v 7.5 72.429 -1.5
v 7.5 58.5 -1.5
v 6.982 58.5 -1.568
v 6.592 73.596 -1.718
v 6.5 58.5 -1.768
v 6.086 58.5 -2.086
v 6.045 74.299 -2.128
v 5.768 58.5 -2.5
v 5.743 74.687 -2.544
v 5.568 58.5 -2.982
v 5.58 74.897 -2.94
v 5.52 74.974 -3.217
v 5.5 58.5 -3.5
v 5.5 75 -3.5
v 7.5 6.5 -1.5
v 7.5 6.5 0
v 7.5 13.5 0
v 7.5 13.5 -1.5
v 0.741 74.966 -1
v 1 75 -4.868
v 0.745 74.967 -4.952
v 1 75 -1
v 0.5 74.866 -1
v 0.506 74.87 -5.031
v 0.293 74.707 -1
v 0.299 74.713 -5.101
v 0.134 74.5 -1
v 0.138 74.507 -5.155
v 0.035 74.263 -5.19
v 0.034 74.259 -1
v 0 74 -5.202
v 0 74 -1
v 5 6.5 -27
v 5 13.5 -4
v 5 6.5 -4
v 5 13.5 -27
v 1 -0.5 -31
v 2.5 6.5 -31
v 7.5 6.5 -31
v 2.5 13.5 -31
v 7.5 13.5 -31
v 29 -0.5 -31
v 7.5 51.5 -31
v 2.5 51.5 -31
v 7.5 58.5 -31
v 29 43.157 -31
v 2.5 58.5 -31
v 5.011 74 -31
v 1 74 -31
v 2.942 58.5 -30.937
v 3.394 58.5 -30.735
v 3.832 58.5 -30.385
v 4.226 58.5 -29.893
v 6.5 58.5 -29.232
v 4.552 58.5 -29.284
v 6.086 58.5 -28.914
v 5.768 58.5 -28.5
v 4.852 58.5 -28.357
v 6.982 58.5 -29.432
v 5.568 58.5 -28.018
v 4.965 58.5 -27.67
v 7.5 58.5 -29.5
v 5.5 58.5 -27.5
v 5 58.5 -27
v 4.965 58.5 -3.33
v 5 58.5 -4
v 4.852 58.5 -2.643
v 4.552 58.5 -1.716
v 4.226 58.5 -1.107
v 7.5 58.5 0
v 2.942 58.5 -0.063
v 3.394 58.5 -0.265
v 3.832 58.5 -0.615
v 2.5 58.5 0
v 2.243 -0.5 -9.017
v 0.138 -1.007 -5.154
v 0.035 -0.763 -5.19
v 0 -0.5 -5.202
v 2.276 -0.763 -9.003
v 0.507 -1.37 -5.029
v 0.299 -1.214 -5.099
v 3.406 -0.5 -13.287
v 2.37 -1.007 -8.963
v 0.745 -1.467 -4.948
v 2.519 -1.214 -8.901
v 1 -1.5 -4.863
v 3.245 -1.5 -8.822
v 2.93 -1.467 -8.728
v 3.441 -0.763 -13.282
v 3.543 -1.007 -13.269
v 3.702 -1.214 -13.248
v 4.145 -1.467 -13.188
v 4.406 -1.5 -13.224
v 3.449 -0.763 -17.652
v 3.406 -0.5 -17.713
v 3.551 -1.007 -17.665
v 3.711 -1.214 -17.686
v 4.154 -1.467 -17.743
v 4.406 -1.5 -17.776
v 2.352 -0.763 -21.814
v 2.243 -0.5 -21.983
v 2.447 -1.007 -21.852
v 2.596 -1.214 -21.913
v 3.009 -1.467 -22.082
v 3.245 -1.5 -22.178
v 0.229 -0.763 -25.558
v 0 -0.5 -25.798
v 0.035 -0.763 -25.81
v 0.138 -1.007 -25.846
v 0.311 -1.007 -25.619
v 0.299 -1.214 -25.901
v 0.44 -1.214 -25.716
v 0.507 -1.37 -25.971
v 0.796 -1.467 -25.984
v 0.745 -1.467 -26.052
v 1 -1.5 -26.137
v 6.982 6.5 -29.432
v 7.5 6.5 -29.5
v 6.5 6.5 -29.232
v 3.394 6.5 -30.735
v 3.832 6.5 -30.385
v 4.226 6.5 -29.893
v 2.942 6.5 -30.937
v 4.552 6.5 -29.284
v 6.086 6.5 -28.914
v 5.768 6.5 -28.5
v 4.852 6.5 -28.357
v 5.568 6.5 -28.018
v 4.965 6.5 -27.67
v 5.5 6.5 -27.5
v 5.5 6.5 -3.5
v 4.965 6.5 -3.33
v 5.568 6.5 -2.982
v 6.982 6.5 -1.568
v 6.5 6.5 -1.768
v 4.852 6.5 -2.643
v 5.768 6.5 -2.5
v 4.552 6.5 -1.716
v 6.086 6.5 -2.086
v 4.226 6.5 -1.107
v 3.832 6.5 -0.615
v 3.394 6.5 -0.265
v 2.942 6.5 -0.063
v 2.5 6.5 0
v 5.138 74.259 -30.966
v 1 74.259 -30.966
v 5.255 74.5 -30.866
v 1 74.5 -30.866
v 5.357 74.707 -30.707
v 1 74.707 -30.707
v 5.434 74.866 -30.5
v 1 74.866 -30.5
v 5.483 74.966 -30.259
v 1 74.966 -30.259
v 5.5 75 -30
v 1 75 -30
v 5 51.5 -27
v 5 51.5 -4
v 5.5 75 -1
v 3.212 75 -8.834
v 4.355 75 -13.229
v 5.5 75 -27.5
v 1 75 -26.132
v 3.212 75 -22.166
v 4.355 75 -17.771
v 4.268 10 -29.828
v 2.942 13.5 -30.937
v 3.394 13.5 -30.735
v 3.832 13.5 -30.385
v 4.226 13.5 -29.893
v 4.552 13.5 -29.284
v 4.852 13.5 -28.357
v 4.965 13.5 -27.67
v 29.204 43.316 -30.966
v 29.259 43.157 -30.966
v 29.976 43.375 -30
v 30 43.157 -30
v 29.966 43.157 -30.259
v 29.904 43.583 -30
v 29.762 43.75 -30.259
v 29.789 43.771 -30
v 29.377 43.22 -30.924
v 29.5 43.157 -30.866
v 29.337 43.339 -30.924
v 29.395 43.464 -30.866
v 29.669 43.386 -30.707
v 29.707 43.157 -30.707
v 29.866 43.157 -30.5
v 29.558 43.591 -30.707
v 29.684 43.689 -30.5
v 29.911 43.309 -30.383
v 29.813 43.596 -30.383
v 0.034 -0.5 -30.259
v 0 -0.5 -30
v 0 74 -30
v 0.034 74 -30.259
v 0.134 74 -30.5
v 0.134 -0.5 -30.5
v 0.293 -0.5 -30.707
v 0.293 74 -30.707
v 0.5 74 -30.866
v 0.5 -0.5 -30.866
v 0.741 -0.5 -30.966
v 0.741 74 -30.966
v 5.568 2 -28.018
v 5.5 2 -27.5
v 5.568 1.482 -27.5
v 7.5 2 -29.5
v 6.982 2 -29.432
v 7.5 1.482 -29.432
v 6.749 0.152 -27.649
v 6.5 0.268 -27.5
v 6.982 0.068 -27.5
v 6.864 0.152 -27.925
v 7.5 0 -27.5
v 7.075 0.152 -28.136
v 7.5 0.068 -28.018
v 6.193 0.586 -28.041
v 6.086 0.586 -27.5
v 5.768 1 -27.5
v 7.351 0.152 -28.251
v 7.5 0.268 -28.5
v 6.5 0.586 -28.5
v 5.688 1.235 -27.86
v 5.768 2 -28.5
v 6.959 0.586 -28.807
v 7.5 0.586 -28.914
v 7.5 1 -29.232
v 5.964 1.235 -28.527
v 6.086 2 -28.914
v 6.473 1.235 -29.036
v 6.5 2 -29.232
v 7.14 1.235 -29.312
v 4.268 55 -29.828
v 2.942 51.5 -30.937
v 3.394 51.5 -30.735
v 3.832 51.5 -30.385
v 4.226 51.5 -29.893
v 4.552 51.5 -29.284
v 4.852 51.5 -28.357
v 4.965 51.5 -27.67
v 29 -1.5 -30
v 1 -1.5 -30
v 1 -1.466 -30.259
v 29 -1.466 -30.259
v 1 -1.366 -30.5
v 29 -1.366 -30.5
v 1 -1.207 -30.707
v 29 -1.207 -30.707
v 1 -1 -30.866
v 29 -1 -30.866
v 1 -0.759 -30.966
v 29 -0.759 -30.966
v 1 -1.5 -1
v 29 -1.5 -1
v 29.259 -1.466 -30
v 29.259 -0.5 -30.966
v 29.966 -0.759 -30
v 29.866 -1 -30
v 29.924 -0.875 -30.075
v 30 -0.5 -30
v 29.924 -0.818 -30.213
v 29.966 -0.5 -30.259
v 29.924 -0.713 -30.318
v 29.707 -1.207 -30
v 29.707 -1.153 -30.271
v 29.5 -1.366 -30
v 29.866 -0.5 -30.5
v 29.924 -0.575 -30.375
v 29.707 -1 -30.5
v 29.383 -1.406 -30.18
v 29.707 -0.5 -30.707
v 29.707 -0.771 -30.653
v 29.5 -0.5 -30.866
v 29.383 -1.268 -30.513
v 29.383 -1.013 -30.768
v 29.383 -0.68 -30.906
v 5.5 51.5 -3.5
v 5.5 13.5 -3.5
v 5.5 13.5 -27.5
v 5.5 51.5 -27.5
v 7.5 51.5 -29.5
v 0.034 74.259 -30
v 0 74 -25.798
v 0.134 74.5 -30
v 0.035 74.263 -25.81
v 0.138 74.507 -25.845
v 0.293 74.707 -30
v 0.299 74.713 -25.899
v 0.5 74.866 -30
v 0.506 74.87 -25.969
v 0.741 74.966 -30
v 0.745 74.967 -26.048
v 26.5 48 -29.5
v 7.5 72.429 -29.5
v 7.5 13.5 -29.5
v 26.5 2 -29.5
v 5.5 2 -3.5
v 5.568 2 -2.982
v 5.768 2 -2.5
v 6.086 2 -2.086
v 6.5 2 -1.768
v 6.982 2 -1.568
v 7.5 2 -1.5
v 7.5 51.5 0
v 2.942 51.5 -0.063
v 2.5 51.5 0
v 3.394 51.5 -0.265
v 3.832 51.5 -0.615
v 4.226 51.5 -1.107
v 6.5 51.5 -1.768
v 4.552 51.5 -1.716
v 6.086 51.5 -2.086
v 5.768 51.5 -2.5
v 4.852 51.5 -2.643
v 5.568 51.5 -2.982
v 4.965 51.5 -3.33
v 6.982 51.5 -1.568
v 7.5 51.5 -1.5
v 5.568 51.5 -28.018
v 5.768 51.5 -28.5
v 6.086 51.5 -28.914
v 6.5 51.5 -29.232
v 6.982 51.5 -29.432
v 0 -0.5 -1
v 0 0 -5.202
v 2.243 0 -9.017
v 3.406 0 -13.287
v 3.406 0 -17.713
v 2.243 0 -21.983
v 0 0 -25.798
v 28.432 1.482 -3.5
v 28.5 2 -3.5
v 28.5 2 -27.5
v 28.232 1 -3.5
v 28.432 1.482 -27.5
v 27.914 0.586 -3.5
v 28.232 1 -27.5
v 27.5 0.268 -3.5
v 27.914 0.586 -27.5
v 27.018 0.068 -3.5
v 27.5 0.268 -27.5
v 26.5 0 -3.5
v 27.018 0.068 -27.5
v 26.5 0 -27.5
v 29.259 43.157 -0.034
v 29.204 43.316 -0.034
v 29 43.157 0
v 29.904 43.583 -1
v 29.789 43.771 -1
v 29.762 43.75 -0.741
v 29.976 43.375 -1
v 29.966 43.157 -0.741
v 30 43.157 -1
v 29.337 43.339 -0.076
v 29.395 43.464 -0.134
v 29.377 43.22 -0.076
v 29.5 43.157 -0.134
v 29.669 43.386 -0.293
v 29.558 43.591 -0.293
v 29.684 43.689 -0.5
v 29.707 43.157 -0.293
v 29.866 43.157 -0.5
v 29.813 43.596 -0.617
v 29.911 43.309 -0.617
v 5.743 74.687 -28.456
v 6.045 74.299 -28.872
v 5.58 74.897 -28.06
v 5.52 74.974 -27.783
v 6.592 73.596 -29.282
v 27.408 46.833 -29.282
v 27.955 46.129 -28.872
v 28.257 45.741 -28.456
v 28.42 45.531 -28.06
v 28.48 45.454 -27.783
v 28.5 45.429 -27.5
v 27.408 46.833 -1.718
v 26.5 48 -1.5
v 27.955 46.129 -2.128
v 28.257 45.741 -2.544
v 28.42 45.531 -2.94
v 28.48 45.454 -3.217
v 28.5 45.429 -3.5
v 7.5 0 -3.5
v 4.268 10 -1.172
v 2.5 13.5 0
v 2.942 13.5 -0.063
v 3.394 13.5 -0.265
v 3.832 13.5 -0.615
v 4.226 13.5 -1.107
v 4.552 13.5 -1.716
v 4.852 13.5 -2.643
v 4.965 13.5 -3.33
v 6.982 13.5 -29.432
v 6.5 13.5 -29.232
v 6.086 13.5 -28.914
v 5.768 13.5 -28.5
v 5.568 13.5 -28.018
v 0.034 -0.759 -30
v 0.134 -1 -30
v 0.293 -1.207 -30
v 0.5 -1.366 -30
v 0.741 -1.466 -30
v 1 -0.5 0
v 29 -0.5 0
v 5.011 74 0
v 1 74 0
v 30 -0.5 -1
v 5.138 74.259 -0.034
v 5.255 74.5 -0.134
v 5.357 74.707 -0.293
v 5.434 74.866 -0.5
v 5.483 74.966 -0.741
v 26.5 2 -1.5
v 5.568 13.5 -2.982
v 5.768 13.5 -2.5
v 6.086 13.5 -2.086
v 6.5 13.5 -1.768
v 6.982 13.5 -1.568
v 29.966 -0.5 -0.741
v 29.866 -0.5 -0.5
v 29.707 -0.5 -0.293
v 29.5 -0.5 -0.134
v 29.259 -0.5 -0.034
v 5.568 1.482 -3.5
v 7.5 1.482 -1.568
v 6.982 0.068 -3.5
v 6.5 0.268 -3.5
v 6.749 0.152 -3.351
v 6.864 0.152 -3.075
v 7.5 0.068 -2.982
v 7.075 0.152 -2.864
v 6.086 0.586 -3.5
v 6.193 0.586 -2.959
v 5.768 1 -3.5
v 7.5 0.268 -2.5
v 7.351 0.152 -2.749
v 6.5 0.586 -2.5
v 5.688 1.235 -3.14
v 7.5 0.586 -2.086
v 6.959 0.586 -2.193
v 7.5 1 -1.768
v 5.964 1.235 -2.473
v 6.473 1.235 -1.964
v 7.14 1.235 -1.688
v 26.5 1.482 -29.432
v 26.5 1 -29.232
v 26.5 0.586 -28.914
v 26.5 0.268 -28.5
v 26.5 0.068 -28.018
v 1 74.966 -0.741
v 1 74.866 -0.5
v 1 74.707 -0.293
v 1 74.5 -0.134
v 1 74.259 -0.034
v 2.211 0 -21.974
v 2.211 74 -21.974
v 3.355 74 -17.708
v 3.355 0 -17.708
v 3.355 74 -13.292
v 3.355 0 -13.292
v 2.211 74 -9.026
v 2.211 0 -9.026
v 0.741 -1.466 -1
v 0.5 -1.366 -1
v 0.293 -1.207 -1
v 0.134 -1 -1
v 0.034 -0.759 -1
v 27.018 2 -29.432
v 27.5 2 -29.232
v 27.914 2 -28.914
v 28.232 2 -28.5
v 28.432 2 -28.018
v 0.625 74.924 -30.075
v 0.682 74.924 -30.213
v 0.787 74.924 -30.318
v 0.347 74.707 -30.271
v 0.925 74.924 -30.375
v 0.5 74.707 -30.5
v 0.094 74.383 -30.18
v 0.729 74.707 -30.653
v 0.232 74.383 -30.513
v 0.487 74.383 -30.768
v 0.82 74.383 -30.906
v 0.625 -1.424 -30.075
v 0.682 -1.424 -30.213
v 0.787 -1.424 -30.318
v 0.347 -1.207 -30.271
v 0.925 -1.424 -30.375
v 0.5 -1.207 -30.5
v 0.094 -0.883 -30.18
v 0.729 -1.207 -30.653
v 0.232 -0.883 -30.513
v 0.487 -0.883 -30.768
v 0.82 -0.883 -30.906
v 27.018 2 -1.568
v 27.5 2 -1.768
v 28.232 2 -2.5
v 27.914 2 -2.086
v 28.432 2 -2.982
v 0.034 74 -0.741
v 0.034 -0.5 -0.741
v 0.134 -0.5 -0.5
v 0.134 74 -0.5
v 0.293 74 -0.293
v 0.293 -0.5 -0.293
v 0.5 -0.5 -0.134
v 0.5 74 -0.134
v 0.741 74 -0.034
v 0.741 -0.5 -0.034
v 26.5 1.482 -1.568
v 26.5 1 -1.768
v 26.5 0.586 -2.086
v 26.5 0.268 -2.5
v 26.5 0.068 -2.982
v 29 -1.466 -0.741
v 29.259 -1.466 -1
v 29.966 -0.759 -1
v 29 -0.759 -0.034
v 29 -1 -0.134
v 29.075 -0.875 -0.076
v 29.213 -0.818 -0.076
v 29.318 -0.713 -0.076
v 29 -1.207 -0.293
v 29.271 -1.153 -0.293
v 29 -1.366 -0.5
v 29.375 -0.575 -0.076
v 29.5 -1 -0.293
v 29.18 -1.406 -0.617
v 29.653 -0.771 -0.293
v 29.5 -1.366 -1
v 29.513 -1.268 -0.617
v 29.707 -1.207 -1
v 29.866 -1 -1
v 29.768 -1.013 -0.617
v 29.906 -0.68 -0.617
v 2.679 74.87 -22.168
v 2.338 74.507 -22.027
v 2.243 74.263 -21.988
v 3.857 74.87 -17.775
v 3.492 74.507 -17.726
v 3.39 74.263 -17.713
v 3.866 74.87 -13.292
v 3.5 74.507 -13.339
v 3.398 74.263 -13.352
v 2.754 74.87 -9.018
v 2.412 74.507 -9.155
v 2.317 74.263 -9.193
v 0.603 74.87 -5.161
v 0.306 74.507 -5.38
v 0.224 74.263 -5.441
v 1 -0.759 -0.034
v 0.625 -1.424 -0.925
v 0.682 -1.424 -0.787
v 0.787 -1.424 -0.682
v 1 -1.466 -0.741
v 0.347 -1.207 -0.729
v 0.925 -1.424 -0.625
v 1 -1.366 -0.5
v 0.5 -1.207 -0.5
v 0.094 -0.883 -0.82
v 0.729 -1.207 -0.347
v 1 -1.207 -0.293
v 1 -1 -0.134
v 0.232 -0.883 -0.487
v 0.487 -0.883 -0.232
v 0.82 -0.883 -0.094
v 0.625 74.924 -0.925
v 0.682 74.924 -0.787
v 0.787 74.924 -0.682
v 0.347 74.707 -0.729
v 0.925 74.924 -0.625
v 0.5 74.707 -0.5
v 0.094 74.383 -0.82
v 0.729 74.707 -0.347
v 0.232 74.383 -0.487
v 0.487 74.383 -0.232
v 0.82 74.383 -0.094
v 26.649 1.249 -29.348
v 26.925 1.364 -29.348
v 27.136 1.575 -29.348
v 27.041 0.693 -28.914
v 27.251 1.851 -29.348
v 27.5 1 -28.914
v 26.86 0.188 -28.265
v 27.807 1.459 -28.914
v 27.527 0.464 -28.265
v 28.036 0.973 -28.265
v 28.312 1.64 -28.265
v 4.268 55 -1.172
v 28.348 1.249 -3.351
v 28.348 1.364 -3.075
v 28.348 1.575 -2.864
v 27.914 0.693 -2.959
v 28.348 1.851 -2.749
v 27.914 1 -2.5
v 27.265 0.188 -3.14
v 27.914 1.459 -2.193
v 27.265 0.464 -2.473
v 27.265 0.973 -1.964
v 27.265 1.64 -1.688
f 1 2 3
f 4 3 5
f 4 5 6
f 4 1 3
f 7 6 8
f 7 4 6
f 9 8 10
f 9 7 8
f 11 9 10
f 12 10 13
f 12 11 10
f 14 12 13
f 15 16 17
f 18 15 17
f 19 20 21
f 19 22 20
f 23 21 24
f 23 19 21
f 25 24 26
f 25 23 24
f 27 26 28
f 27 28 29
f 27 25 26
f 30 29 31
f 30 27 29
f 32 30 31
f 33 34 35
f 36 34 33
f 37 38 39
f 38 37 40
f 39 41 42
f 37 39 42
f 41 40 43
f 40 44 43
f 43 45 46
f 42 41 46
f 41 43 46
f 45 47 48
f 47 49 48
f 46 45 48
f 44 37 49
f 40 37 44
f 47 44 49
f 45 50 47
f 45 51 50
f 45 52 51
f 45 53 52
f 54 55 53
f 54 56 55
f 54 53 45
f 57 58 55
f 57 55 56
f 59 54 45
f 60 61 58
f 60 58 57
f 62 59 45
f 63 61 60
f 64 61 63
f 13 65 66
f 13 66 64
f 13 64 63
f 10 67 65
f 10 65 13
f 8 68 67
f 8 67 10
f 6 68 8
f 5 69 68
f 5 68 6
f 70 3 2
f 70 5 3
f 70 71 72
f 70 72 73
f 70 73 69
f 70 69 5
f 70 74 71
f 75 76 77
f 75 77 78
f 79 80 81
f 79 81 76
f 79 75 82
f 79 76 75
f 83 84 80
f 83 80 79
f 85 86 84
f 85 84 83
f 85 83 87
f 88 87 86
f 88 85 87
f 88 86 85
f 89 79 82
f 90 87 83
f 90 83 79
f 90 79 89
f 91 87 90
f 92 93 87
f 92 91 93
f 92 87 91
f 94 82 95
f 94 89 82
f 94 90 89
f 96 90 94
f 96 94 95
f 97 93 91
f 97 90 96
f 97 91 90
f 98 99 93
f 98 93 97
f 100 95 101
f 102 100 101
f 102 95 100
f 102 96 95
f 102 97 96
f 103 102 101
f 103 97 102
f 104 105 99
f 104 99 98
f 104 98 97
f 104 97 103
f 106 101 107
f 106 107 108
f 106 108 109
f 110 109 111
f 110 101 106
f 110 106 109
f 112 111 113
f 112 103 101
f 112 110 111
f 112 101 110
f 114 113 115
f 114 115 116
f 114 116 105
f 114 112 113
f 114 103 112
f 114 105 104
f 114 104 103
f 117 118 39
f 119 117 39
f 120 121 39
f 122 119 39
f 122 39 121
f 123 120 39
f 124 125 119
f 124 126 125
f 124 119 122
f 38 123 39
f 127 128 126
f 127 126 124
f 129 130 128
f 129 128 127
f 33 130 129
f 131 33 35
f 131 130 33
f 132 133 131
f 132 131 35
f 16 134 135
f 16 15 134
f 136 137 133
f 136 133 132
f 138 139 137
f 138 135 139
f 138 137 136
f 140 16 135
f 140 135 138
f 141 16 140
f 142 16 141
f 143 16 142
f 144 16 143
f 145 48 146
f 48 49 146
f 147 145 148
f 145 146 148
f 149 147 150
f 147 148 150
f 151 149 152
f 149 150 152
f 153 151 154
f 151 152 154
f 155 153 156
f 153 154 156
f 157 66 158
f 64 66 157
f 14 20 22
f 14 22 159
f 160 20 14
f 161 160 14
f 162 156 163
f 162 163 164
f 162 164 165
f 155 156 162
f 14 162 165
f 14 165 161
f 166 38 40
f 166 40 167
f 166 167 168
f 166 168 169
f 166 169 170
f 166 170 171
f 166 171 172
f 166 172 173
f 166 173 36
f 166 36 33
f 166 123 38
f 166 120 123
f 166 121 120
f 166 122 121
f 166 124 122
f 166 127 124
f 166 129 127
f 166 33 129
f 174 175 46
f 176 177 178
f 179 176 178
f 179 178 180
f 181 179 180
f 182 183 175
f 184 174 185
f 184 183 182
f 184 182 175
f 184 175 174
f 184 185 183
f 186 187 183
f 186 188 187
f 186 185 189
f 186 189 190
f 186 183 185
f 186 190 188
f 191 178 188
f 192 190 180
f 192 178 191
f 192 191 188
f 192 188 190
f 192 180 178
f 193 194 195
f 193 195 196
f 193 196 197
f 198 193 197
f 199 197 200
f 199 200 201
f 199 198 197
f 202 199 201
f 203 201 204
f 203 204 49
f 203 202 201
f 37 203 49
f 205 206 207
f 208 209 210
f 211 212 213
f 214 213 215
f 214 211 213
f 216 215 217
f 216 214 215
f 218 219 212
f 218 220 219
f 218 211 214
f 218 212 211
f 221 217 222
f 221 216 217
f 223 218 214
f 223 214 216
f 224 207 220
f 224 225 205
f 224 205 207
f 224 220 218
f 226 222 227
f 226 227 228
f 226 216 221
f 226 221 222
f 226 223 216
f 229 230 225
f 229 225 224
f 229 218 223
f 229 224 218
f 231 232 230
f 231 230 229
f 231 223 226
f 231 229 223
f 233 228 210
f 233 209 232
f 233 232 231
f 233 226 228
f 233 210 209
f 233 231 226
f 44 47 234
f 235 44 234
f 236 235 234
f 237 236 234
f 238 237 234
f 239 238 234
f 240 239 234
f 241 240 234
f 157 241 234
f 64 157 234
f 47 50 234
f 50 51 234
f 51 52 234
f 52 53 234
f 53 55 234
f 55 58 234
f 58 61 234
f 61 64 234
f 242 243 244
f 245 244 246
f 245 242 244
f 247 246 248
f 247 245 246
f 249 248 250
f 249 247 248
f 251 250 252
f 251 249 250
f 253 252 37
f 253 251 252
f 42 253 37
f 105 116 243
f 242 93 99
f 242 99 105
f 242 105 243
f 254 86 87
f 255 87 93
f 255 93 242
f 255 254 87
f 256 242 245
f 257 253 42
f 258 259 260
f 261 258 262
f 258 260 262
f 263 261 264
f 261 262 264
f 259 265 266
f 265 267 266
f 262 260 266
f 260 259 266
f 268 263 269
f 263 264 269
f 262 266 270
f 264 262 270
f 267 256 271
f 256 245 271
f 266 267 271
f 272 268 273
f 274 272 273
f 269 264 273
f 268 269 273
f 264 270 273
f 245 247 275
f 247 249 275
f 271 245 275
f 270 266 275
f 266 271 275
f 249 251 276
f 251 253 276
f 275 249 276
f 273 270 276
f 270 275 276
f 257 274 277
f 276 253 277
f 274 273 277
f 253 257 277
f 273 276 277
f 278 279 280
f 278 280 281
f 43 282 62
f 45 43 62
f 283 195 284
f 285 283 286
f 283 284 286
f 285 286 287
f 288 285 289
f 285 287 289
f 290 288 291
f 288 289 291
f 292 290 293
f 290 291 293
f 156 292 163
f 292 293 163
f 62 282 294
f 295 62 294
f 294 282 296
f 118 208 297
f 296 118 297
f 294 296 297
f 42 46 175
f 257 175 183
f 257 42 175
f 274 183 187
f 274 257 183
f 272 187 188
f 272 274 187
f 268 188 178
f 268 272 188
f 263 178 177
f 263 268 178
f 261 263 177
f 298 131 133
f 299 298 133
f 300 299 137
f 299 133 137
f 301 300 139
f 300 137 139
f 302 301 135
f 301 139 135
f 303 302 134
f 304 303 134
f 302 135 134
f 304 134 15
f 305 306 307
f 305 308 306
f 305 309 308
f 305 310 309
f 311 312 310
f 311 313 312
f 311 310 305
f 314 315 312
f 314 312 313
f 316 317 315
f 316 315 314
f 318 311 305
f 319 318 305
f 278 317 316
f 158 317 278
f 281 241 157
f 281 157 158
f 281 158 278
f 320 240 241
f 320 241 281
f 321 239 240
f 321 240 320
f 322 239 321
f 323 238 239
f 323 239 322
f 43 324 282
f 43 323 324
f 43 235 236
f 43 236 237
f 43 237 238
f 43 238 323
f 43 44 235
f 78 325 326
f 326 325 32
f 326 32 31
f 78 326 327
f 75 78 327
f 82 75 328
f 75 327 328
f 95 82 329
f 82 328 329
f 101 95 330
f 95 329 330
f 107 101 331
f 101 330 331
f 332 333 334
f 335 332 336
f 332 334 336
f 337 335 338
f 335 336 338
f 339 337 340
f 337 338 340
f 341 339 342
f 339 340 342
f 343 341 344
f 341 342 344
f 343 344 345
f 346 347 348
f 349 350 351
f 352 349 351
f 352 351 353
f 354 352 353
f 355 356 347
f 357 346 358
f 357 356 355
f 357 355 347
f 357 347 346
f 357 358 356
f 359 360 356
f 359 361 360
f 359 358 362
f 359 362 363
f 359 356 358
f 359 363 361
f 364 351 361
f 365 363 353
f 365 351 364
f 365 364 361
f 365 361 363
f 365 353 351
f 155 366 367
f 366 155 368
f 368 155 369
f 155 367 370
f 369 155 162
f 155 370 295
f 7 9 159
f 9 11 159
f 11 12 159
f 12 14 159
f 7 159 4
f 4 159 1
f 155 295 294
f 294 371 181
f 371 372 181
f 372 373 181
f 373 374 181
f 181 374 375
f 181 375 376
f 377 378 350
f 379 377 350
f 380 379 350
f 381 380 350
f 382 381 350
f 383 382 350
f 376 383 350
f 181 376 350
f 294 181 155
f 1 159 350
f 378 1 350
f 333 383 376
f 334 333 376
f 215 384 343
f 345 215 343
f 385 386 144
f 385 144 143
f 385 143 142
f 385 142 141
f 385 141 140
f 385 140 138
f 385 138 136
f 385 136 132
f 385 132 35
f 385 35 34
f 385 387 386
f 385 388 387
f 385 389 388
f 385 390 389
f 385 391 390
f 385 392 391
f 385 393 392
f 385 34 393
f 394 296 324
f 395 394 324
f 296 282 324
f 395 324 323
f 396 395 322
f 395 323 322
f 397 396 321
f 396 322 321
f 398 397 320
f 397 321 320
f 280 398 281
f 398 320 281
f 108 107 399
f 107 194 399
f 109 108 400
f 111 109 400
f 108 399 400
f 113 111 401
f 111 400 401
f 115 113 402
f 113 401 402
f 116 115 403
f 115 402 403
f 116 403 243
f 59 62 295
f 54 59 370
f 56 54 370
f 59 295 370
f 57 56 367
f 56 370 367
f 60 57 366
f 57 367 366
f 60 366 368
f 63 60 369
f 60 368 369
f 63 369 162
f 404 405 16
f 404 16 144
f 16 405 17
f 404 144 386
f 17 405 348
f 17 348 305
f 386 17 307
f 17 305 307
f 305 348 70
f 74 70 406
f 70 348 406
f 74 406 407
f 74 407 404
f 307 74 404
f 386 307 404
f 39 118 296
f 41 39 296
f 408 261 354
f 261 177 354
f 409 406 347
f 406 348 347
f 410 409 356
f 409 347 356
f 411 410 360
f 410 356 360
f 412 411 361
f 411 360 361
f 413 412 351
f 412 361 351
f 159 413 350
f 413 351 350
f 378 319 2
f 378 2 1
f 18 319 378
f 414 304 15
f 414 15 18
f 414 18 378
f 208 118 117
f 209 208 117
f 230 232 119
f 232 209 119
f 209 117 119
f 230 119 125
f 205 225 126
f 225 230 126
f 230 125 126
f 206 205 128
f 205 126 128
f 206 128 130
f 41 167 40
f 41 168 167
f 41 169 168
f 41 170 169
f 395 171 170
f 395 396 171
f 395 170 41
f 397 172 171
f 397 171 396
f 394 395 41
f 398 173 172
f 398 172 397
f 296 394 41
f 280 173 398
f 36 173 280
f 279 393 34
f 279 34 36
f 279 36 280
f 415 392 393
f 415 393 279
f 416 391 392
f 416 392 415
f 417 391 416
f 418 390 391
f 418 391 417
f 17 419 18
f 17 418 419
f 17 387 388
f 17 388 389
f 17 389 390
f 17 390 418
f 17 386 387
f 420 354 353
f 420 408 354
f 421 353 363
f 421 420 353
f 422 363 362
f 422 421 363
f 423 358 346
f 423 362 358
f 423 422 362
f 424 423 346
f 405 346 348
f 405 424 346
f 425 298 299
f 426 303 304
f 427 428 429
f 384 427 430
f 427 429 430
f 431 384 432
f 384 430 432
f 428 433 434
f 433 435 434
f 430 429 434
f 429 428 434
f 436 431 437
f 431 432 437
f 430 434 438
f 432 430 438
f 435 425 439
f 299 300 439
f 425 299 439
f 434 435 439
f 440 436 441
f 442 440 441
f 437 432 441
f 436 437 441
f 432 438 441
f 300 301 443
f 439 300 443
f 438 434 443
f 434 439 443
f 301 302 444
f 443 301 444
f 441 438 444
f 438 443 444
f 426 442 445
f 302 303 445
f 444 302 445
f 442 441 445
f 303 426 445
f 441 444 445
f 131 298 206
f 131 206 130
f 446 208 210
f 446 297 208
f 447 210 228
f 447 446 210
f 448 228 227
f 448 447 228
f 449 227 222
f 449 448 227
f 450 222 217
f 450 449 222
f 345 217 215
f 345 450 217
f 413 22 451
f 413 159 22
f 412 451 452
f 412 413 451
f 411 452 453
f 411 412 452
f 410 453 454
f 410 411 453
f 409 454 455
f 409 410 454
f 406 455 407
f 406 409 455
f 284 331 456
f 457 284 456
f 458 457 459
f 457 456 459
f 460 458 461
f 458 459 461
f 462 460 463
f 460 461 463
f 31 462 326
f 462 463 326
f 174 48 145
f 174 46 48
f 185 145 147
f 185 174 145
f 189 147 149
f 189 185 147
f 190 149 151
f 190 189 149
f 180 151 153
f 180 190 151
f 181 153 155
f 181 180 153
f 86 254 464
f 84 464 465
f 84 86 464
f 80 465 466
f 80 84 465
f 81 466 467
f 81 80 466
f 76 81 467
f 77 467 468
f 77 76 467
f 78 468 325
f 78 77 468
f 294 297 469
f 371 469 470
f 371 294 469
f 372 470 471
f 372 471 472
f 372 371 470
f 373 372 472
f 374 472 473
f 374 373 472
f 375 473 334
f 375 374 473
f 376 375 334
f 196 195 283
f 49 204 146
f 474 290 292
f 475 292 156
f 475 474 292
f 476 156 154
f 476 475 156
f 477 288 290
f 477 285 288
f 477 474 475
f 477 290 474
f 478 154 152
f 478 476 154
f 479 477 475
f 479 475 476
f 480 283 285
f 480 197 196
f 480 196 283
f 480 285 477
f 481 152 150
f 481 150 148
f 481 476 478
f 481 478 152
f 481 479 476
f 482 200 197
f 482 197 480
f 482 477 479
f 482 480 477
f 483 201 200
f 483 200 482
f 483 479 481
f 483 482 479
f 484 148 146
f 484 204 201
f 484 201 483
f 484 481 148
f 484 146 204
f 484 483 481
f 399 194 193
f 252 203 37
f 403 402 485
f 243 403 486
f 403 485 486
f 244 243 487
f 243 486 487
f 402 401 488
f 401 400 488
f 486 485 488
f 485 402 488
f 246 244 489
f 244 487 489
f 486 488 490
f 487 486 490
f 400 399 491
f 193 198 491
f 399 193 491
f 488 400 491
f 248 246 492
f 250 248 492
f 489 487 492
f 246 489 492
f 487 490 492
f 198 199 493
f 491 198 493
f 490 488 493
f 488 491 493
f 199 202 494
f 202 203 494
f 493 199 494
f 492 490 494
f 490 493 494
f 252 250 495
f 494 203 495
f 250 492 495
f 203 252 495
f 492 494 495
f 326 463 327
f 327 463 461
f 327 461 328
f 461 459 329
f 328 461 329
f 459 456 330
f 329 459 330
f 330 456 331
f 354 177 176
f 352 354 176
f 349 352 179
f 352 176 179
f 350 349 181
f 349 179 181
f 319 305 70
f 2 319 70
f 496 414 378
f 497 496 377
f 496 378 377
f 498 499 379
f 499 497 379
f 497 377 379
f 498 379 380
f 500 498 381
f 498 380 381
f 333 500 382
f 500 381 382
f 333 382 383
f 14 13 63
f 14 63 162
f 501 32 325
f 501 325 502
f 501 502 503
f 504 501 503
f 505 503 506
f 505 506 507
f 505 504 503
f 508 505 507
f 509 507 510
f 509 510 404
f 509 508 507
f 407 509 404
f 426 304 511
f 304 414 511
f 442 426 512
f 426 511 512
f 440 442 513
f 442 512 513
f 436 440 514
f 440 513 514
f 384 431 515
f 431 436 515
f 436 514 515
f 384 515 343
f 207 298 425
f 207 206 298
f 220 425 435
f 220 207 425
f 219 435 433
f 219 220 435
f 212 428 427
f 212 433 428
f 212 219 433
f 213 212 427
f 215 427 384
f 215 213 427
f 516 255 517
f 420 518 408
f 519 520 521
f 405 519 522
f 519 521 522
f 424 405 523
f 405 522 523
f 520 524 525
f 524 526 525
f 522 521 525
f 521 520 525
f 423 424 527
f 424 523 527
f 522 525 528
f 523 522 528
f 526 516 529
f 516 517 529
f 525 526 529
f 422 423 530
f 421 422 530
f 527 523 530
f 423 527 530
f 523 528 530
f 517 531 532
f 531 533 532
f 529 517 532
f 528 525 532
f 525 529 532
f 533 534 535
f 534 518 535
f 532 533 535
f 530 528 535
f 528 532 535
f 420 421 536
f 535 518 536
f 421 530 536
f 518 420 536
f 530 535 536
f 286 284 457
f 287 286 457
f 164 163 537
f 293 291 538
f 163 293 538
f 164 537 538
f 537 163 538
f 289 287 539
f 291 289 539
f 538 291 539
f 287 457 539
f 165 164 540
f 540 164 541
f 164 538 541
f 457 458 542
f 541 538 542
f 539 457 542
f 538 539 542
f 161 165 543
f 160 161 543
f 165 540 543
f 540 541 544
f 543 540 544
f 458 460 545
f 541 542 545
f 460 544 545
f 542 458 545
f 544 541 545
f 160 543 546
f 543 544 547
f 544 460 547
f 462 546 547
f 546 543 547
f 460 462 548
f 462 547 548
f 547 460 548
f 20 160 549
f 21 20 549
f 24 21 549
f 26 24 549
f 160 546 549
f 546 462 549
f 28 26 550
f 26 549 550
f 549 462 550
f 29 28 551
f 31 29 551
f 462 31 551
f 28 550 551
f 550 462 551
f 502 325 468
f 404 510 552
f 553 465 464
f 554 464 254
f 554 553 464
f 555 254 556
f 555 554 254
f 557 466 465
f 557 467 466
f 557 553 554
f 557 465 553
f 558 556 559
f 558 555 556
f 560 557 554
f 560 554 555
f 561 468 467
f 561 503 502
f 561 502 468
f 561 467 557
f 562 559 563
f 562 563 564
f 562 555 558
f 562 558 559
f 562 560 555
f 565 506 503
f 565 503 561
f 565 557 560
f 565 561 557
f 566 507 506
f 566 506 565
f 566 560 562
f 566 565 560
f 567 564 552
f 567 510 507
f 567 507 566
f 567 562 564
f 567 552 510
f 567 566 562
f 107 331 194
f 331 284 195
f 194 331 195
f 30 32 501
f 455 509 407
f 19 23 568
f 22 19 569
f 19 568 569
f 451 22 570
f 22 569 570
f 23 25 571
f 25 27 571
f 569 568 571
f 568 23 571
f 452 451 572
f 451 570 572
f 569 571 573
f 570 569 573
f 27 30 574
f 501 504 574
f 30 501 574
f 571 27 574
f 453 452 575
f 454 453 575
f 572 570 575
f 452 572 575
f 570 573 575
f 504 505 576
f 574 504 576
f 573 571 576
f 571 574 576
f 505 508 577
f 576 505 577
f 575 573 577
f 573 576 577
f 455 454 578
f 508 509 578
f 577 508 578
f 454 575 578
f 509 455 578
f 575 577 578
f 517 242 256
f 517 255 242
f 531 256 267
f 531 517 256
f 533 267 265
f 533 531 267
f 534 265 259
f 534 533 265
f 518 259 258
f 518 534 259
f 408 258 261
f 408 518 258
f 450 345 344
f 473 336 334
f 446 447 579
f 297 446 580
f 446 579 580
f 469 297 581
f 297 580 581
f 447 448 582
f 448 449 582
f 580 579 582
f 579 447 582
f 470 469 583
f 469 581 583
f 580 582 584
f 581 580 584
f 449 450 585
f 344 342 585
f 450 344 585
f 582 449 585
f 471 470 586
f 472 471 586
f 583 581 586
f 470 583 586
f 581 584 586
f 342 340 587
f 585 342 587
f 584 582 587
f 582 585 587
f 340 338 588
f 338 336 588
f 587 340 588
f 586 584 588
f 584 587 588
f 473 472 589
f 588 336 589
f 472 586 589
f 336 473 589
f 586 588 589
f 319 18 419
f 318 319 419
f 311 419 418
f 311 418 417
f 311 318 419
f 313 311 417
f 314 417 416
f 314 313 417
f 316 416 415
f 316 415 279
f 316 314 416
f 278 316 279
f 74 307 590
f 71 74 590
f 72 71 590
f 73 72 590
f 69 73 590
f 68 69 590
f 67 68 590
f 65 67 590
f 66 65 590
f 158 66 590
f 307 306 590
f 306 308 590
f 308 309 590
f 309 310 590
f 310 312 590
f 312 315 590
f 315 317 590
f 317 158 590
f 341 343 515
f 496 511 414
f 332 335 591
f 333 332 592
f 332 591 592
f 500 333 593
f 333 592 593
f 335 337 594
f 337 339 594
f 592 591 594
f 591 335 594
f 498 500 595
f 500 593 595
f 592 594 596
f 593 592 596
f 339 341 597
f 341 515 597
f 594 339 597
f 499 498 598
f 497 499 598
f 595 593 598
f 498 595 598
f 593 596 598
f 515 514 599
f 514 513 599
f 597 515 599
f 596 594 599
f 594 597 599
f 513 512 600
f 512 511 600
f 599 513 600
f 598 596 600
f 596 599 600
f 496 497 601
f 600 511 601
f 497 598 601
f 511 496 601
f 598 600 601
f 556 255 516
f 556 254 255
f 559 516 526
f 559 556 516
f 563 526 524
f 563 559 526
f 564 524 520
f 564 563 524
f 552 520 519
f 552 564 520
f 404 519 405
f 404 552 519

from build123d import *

# Parameters (mm, degrees)
SKETCH1_W           = 23
SKETCH1_H           = 28
BOSS_EXTRUDE1_DEPTH = 75
BOSS_EXTRUDE2_DEPTH = 1.5
CUT_EXTRUDE1_DEPTH  = 87.521673585
FILLET1_R           = 1
SKETCH7_W           = 2
SKETCH7_H           = 7
CUT_EXTRUDE2_DEPTH  = 87.521673672
SKETCH8_W           = 31
SKETCH8_H           = 7
CUT_EXTRUDE3_DEPTH  = 0.5
FILLET2_SIZE        = 2.5
FILLET2_SIZE_2      = 4
FILLET3_R           = 2


with BuildPart() as part:
    # Sketch1 → Boss-Extrude1 (new body)
    with BuildSketch(Plane(origin=(0, 0, 0), x_dir=(1, 0, 0), z_dir=(0, 1, 0))):
        with BuildLine():
            Line((0, 0), (30, 0))
            Line((30, 0), (30, 31))
            Line((30, 31), (0, 31))
            Line((0, 31), (0, 25.798058069))
            ThreePointArc((0, 25.798058069), (3.5, 15.5), (0, 5.201941931))
            Line((0, 5.201941931), (0, 0))
        make_face()
        with Locations((17, 15.5)):
            Rectangle(SKETCH1_W, SKETCH1_H, mode=Mode.SUBTRACT)
    extrude(amount=BOSS_EXTRUDE1_DEPTH)

    # Sketch2 → Boss-Extrude2 (add)
    with BuildSketch(Plane.XZ):
        with BuildLine():
            Line((0, -25.798058069), (0, -31))
            Line((0, -31), (30, -31))
            Line((30, -31), (30, 0))
            Line((30, 0), (0, 0))
            Line((0, 0), (0, -5.201941931))
            ThreePointArc((0, -5.201941931), (3.55300213, -15.5), (0, -25.798058069))
        make_face()
    extrude(amount=BOSS_EXTRUDE2_DEPTH)

    # Sketch6 → Cut-Extrude1 (cut, through all)
    with BuildSketch(Plane.XY):
        Polygon((5.5, 75), (30, 43.5), (30, 75), align=None)
    extrude(amount=-CUT_EXTRUDE1_DEPTH, mode=Mode.SUBTRACT)

    # Fillet1
    fillet1_edges = [part.edges().sort_by_distance(p)[0] for p in [
        (0, 36.75, -31),
        (0, 36.75, 0),
        (0, 75, -28.399029035),
        (3.5, 75, -15.5),
        (0, -1.5, -2.600970965),
        (3.55300213, -1.5, -15.5),
        (0, -1.5, -28.399029035),
        (15, -1.5, -31),
        (30, -1.5, -15.5),
        (15, -1.5, 0),
        (0, 75, -2.600970965),
        (30, 21, -31),
        (2.75, 75, -31),
        (30, 21, 0),
        (17.75, 59.25, -31),
        (30, 43.5, -15.5),
        (17.75, 59.25, 0),
        (2.75, 75, 0),
    ]]
    fillet(fillet1_edges, radius=FILLET1_R)

    # Sketch7 → Cut-Extrude2 (cut, through all)
    with BuildSketch(Plane.XY):
        with Locations((6.5, 55)):
            Rectangle(SKETCH7_W, SKETCH7_H)
        with Locations((6.5, 10)):
            Rectangle(SKETCH7_W, SKETCH7_H)
    extrude(amount=-CUT_EXTRUDE2_DEPTH, mode=Mode.SUBTRACT)

    # Sketch8 → Cut-Extrude3 (cut)
    with BuildSketch(Plane(origin=(5.5, 0, 0), x_dir=(0, 0, -1), z_dir=(1, 0, 0))):
        with Locations((15.5, 55)):
            Rectangle(SKETCH8_W, SKETCH8_H)
        with Locations((15.5, 10)):
            Rectangle(SKETCH8_W, SKETCH8_H)
    extrude(amount=-CUT_EXTRUDE3_DEPTH, mode=Mode.SUBTRACT)

    # Fillet2
    # an asymmetric fillet: 4, 2.5 mm, written as the material it takes off along each edge
    with BuildSketch(Plane(origin=(5, 6.5, -31), x_dir=(-1, 0, 0), z_dir=(0, 1, 0)), Plane(origin=(5, 13.5, 0), x_dir=(-1, 0, 0), z_dir=(0, -1, 0))) as fillet2_piece_1:
        with BuildLine():
            Bezier((FILLET2_SIZE, 0), (0, 0), (0, FILLET2_SIZE_2), weights=[1, 0.707106781, 1])
            Line((0, FILLET2_SIZE_2), (0, 0))
            Line((0, 0), (FILLET2_SIZE, 0))
        make_face()
    extrude(amount=7, mode=Mode.SUBTRACT)
    with BuildSketch(Plane(origin=(5, 58.5, -31), x_dir=(-1, 0, 0), z_dir=(0, -1, 0)), Plane(origin=(5, 51.5, 0), x_dir=(-1, 0, 0), z_dir=(0, 1, 0))) as fillet2_piece_2:
        with BuildLine():
            Bezier((FILLET2_SIZE, 0), (0, 0), (0, -FILLET2_SIZE_2), weights=[1, 0.707106781, 1])
            Line((0, -FILLET2_SIZE_2), (0, 0))
            Line((0, 0), (FILLET2_SIZE, 0))
        make_face()
    extrude(amount=7, mode=Mode.SUBTRACT)

    # Fillet3
    fillet3_edges = [part.edges().sort_by_distance(p)[0] for p in [
        (5.5, 32.5, -29.5),
        (5.5, 3.25, -29.5),
        (5.5, 32.5, -1.5),
        (5.5, 3.25, -1.5),
        (5.5, 0, -15.5),
        (5.5, 66.75, -29.5),
        (17, 0, -1.5),
        (5.5, 66.75, -1.5),
        (28.5, 0, -15.5),
        (17, 0, -29.5),
        (28.5, 22.714285714, -29.5),
        (28.5, 22.714285714, -1.5),
    ]]
    fillet(fillet3_edges, radius=FILLET3_R)


solid = part.part
